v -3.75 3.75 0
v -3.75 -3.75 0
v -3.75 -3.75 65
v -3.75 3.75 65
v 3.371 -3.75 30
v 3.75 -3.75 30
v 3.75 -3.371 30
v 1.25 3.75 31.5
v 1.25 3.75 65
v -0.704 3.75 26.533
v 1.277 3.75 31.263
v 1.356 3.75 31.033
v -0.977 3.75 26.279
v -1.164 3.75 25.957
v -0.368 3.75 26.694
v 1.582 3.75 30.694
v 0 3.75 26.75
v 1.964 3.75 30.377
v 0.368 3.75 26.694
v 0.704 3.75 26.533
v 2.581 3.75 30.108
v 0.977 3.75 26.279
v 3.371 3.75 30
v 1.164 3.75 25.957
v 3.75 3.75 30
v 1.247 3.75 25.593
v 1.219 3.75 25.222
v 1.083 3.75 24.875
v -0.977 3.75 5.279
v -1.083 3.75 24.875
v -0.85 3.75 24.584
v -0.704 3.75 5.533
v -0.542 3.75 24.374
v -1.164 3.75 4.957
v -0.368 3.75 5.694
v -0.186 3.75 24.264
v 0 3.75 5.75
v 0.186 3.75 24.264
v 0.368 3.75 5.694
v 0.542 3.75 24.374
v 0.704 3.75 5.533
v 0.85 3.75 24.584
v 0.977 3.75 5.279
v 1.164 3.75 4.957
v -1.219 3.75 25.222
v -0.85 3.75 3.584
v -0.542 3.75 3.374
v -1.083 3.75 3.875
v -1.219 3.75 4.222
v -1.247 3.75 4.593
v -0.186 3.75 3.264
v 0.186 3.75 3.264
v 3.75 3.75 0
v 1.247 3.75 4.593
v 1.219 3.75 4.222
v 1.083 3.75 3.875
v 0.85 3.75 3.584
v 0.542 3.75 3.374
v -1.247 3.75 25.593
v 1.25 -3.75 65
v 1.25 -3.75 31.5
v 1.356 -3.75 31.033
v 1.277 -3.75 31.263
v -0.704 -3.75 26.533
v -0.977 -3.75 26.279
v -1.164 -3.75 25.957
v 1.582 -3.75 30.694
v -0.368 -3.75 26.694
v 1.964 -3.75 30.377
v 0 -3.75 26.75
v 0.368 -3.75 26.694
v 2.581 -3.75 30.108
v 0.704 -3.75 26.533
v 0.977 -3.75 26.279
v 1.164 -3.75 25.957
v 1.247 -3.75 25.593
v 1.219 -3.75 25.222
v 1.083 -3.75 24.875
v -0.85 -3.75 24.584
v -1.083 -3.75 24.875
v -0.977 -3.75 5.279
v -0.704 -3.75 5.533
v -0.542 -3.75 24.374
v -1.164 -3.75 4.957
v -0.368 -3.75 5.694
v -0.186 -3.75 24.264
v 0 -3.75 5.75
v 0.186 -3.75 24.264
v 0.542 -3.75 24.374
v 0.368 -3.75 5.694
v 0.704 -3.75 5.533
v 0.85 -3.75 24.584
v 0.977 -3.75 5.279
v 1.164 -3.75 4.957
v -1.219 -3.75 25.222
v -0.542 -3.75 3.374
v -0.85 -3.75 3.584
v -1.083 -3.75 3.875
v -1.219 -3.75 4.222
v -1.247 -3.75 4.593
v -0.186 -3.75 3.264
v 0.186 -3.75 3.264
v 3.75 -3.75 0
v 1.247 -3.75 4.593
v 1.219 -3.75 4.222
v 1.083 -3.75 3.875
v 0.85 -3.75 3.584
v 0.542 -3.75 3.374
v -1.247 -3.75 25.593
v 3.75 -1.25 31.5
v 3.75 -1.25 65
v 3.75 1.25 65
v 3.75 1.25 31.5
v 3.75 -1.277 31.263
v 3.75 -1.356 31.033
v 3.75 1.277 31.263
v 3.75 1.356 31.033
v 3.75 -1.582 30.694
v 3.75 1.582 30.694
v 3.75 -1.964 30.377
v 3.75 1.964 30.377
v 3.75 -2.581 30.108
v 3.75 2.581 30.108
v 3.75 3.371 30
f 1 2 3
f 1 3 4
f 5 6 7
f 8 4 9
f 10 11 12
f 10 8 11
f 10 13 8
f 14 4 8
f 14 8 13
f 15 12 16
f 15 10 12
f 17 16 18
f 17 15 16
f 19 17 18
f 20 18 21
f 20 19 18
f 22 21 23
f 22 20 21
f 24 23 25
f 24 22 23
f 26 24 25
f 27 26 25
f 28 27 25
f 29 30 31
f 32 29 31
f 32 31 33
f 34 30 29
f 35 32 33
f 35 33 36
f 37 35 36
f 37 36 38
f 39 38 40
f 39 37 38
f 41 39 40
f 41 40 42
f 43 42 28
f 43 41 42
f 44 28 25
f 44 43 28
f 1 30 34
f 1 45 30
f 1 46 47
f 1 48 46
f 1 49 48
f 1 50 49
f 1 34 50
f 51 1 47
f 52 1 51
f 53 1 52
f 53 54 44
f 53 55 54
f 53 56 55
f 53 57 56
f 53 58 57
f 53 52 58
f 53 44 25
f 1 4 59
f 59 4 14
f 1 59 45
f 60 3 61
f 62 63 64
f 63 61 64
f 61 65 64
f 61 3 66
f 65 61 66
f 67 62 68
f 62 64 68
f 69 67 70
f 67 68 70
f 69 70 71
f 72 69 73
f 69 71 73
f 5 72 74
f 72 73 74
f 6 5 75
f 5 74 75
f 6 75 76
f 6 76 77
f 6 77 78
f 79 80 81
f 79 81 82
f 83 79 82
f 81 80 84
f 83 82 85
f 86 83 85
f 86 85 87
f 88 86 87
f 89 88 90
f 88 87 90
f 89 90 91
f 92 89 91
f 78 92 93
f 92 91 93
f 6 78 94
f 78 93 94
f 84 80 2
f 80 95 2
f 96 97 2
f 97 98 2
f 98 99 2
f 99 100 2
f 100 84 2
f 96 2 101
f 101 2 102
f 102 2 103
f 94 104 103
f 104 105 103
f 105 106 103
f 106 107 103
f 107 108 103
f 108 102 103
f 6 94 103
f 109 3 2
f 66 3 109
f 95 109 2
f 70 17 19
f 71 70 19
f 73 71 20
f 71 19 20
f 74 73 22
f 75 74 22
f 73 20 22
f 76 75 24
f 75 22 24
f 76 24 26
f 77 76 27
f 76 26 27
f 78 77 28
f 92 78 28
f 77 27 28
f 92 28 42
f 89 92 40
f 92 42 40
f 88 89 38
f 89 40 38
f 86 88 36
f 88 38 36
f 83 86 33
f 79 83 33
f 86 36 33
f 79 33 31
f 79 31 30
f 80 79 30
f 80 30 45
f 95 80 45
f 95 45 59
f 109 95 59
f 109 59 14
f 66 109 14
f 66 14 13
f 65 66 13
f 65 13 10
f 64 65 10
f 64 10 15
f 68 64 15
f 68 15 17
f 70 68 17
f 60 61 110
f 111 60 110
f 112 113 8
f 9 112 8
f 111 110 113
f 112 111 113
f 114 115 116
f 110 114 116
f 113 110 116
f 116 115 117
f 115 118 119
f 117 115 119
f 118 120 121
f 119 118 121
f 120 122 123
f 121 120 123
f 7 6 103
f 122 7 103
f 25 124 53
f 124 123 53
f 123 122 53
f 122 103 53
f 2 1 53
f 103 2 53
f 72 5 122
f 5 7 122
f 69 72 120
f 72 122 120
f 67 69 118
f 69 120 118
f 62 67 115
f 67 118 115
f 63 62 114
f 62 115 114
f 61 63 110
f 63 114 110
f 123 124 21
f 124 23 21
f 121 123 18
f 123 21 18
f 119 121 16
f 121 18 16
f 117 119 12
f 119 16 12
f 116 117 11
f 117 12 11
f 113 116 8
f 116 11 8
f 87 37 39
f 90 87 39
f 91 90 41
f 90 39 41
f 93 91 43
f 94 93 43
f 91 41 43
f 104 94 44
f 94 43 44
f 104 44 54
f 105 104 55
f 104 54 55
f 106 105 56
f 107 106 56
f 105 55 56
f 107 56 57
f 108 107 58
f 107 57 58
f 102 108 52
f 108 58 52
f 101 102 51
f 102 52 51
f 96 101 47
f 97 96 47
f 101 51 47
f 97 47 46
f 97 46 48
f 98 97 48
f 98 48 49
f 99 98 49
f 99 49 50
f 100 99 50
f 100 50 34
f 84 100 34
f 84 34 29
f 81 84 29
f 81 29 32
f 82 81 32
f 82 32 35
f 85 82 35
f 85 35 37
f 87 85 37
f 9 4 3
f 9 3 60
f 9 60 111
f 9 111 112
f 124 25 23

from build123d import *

# Parameters (mm, degrees)
ESQUISSE1_W             = 7.5
ESQUISSE1_H             = 7.5
BOSS_EXTRU_1_DEPTH      = 65
ESQUISSE2_R             = 1.25
ENL_V_MAT_EXTRU_1_DEPTH = 66.538633645
ENL_V_START             = -30
ENL_V_MAT_EXTRU_2_DEPTH = 36.215987304
CONG_1_R                = 1.5


with BuildPart() as part:
    # Esquisse1 → Boss.-Extru.1 (new body)
    with BuildSketch(Plane.XY):
        Rectangle(ESQUISSE1_W, ESQUISSE1_H)
    extrude(amount=BOSS_EXTRU_1_DEPTH)

    # Esquisse2 → Enlèv. mat.-Extru.1 (cut, through all)
    with BuildSketch(Plane(origin=(0, 3.75, 0), x_dir=(1, 0, 0), z_dir=(0, 1, 0))):
        with Locations(Location((0, -4.5, 0), (0, 0, 270))):
            Circle(ESQUISSE2_R)
        with Locations(Location((0, -25.5, 0), (0, 0, 270))):
            Circle(ESQUISSE2_R)
    extrude(amount=-ENL_V_MAT_EXTRU_1_DEPTH, mode=Mode.SUBTRACT)

    # Esquisse3 → Enlèv. mat.-Extru.2 (cut, through all)
    with BuildSketch(Plane(origin=(0, 0, 0), x_dir=(-1, 0, 0), z_dir=(0, 0, -1)).offset(ENL_V_START)):
        Polygon((-1.25, 3.75), (-3.75, 3.75), (-3.75, 1.25), align=None)
        Polygon((-3.75, -1.25), (-3.75, -3.75), (-1.25, -3.75), align=None)
    extrude(amount=-ENL_V_MAT_EXTRU_2_DEPTH, mode=Mode.SUBTRACT)

    # Congé1
    cong_1_edges = [part.edges().sort_by_distance(p)[0] for p in [
        (2.5, 2.5, 30),
        (2.5, -2.5, 30),
    ]]
    fillet(cong_1_edges, radius=CONG_1_R)


solid = part.part
